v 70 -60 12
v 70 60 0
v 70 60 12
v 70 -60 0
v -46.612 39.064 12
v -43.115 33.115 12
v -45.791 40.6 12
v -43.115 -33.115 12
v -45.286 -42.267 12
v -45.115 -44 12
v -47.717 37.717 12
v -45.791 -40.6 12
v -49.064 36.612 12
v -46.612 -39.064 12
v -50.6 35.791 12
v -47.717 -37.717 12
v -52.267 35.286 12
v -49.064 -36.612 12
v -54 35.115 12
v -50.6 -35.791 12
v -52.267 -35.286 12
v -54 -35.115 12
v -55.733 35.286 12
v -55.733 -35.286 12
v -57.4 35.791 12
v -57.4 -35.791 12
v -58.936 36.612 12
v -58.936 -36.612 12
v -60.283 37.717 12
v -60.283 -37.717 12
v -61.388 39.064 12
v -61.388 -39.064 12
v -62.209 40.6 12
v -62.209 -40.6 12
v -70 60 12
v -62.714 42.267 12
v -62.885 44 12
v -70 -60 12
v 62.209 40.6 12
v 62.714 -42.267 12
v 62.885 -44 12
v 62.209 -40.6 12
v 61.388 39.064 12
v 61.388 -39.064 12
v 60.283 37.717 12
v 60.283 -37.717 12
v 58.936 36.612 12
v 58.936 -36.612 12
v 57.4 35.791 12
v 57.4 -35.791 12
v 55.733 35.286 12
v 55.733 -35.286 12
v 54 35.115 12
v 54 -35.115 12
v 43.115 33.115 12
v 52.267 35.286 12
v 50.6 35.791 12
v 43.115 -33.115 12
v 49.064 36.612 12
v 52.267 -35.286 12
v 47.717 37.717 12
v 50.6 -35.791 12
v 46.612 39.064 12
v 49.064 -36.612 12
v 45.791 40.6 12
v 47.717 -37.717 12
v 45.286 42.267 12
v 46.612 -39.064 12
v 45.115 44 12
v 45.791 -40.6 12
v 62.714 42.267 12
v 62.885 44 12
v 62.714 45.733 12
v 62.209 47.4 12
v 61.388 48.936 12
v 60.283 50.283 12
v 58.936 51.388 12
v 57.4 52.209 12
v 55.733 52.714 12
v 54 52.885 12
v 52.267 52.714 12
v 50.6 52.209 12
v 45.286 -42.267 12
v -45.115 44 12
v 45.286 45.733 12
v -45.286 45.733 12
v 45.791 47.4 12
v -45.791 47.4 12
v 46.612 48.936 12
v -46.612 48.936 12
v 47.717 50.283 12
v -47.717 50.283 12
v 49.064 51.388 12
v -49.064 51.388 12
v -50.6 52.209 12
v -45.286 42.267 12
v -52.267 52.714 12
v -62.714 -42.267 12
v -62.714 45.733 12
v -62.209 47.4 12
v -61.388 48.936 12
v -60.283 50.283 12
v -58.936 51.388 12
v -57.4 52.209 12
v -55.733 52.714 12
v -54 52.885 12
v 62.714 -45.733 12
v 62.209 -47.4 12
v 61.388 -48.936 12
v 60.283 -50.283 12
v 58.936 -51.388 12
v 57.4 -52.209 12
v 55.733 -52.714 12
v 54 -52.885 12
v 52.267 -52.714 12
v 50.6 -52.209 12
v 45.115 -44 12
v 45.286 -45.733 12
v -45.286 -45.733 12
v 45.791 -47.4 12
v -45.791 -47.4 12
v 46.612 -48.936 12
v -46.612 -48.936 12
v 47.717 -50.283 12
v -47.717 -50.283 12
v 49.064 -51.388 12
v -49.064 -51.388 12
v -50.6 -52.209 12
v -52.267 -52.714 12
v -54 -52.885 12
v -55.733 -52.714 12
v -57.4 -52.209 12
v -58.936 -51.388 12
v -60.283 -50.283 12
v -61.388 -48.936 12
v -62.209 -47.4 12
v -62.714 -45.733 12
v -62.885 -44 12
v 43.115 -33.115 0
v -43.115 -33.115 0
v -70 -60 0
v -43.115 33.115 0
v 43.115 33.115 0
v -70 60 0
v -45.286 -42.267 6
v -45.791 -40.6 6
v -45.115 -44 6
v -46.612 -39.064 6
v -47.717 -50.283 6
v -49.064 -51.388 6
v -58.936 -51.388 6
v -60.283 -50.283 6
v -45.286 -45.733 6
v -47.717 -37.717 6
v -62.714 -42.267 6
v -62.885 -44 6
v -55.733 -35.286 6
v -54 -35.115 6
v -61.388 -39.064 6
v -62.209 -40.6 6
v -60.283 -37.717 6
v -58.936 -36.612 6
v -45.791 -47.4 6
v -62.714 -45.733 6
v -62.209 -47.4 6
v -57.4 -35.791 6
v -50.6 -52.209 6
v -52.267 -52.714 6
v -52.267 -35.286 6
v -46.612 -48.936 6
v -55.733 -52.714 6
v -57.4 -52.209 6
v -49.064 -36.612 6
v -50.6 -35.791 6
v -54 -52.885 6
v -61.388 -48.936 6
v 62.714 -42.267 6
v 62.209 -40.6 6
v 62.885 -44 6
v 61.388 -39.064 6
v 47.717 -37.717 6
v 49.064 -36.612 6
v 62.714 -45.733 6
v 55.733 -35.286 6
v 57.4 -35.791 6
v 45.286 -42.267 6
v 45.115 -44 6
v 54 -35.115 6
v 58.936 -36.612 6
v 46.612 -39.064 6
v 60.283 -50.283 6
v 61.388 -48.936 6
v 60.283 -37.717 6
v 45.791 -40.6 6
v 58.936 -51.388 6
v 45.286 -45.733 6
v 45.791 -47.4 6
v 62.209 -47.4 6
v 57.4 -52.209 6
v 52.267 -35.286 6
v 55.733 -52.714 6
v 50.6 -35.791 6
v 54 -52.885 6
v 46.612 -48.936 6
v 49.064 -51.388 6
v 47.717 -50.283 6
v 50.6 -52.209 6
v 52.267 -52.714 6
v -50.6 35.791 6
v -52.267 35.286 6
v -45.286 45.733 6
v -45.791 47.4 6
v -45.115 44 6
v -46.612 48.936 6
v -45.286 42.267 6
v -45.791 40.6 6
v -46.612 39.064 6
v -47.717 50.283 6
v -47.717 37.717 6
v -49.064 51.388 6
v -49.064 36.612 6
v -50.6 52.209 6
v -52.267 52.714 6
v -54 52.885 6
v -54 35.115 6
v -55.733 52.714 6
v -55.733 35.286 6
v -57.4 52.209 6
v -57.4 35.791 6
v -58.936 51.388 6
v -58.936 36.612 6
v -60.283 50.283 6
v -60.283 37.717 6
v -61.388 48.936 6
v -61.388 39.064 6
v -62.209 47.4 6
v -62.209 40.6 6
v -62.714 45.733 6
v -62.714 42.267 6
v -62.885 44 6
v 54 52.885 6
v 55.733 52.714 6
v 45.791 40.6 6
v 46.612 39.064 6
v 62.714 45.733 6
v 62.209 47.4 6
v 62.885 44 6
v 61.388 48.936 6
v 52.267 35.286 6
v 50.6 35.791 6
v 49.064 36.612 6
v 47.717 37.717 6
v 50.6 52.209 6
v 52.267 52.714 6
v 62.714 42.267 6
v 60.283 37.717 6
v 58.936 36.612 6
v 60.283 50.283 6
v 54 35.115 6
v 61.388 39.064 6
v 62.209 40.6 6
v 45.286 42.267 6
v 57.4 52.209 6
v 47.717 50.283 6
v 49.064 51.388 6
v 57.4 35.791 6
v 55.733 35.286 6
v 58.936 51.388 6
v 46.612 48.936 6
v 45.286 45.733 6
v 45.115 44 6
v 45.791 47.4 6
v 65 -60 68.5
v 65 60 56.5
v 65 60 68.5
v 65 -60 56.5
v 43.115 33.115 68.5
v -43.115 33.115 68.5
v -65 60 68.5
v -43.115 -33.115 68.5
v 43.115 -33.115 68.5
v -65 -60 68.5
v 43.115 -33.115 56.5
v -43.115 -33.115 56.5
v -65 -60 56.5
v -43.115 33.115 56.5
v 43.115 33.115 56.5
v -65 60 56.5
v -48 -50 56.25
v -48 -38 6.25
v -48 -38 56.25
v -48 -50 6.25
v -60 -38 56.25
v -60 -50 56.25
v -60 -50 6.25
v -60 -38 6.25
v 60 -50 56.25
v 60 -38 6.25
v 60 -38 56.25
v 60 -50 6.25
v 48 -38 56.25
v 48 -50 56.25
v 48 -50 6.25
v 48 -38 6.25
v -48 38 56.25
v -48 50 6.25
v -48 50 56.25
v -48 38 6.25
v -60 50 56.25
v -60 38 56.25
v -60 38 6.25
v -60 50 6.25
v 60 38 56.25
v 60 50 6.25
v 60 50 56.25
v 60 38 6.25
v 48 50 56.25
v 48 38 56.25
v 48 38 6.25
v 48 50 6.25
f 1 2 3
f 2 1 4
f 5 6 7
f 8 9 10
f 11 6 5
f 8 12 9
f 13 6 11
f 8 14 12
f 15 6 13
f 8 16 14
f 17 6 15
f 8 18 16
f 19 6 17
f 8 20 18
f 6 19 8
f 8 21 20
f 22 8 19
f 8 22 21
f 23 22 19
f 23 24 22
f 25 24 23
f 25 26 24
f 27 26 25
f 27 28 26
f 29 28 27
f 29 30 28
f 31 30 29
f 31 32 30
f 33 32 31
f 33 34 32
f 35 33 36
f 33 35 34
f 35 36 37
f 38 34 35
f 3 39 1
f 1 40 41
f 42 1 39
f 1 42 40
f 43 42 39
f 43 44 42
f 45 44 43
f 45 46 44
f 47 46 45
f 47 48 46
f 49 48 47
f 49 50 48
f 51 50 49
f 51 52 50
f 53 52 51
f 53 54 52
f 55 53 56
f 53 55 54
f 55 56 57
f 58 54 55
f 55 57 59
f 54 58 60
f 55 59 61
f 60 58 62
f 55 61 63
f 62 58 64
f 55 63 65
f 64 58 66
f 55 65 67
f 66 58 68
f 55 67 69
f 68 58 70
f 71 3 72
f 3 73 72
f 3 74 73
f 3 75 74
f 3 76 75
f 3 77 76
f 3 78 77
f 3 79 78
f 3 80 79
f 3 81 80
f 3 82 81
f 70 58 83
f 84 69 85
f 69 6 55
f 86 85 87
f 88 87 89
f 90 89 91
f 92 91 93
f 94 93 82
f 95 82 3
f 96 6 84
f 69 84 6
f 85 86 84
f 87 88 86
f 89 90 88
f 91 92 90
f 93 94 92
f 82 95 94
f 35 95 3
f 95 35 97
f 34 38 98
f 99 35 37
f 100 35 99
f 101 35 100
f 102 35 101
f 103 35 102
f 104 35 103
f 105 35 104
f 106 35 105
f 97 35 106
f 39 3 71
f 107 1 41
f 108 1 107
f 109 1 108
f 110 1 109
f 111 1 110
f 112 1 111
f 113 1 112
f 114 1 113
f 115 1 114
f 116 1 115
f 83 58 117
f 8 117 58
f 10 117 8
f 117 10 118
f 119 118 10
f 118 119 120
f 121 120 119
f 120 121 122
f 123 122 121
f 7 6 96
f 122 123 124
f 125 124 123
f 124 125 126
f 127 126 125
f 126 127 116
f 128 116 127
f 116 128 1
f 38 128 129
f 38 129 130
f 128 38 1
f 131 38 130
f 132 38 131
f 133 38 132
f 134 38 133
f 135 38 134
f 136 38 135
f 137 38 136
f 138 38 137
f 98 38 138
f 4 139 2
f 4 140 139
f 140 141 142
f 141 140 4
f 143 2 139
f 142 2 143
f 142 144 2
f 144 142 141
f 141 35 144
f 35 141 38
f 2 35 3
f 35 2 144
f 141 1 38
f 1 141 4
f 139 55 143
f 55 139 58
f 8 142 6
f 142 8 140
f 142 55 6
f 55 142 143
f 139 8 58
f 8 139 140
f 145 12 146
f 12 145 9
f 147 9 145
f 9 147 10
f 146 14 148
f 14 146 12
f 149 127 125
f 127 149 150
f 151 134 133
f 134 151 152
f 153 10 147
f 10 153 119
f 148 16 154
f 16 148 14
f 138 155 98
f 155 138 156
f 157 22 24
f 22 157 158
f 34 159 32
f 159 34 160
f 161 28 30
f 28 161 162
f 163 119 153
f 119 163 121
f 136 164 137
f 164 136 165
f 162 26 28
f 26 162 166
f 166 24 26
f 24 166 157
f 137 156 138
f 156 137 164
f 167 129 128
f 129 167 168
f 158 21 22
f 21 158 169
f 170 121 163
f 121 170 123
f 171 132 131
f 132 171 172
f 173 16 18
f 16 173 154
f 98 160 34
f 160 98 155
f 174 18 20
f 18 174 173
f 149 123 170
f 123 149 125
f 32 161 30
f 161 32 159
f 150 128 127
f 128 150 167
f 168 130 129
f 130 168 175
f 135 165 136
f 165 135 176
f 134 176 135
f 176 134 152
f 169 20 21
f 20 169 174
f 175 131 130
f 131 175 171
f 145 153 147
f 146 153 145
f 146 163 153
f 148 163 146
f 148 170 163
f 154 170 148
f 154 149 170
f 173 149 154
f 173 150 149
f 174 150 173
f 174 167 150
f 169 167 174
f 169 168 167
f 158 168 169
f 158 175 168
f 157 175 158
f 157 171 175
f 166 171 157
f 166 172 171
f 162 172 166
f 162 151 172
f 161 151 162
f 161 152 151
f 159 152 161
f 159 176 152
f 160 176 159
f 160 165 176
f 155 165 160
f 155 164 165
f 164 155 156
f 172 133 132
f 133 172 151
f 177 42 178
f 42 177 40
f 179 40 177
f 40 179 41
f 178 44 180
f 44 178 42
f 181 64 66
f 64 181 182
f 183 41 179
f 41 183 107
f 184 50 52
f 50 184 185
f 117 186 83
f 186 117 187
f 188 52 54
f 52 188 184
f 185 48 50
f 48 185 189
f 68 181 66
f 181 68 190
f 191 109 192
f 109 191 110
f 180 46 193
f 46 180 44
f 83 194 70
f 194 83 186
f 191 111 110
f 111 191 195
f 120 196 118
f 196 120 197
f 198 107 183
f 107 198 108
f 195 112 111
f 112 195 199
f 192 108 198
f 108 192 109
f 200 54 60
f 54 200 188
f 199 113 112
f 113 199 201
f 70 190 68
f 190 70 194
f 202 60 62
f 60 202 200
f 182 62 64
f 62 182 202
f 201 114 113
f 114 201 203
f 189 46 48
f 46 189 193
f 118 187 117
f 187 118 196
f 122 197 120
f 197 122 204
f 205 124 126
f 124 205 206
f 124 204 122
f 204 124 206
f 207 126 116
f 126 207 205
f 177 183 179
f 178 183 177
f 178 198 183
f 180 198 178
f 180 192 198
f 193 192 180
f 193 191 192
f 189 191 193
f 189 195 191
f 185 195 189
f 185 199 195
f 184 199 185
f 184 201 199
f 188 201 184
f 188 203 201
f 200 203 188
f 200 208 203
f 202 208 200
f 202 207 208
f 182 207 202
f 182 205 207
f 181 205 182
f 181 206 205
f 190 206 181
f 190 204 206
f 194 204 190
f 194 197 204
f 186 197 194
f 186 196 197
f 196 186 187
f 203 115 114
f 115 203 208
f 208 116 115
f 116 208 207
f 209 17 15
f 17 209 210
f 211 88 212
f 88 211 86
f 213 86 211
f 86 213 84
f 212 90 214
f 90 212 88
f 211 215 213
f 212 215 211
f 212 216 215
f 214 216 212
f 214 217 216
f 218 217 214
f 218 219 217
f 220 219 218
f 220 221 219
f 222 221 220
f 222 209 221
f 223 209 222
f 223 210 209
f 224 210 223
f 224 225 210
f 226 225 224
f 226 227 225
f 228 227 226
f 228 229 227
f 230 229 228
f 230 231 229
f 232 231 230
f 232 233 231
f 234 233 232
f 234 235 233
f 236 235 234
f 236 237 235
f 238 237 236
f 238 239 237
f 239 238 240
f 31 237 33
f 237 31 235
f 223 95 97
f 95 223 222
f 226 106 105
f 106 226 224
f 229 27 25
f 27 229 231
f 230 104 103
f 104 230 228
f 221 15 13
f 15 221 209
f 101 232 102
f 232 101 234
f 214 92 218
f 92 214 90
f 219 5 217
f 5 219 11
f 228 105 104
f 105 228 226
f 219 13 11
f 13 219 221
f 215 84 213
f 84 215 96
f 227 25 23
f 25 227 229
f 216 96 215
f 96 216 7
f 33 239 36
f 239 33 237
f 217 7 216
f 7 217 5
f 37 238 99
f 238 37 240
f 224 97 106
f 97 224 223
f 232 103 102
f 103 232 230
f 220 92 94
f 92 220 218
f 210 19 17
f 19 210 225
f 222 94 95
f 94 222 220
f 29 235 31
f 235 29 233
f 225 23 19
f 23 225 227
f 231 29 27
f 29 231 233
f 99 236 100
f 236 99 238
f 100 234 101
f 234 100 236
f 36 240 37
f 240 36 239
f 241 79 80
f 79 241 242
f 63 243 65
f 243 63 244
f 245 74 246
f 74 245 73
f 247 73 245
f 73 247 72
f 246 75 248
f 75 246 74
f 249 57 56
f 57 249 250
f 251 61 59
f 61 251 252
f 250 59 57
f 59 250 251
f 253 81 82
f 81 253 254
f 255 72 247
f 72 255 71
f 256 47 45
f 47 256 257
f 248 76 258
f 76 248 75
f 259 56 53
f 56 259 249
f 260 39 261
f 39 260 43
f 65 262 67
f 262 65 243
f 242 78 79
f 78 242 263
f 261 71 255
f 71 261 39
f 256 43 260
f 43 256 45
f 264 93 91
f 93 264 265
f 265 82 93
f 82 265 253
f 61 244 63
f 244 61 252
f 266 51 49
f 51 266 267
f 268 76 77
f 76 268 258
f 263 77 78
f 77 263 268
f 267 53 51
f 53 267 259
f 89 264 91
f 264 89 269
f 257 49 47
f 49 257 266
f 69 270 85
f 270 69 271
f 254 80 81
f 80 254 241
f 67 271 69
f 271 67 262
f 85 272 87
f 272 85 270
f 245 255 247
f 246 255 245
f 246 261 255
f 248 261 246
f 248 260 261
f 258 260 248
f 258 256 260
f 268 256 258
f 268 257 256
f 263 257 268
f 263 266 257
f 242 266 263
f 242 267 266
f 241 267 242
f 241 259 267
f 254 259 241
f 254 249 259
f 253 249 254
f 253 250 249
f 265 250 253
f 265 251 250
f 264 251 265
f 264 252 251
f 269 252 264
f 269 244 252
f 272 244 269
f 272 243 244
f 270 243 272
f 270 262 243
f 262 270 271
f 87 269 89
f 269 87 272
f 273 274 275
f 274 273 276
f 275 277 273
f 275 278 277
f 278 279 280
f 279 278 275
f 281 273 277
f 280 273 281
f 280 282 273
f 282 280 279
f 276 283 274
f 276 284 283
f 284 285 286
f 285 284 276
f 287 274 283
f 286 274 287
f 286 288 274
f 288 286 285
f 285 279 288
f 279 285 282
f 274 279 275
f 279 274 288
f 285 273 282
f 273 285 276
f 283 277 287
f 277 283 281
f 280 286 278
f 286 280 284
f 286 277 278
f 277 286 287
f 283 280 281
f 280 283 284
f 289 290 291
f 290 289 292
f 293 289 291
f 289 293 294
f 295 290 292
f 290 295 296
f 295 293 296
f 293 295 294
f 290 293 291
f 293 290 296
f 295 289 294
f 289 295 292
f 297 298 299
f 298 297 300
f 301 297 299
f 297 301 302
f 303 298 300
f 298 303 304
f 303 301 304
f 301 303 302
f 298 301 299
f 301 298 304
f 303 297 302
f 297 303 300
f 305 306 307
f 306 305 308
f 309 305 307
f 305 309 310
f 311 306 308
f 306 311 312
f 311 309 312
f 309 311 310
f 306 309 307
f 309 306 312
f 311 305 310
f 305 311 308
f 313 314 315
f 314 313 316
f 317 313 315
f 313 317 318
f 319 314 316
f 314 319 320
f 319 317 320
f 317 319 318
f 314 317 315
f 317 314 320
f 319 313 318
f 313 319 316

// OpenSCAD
$fn = 32;

// ------------------------------------------------------------------------
// Frame cube: base 140 x 120 mm, posts 50 mm tall
// Every part is its own module, assembly() places every instance.
// ------------------------------------------------------------------------

// --- part 1 ---
module base_frame() {
  difference() {
    translate([-70, -60, 0]) cube([140, 120, 12]);
    translate([-43.115, -33.115, -1]) cube([86.23, 66.23, 14]);
    translate([-54, -44, 6]) cylinder(h = 7, d = 17.77);
    translate([54, -44, 6]) cylinder(h = 7, d = 17.77);
    translate([-54, 44, 6]) cylinder(h = 7, d = 17.77);
    translate([54, 44, 6]) cylinder(h = 7, d = 17.77);
  }
}

// --- part 2 ---
module corner_post() {
  translate([-6, -6, 0]) cube([12, 12, 50]);
}

// --- part 3 ---
module top_frame() {
  difference() {
    translate([-65, -60, 0]) cube([130, 120, 12]);
    translate([-43.115, -33.115, -1]) cube([86.23, 66.23, 14]);
  }
}

// --- assembly ---
module assembly() {
  color([0.80, 0.24, 0.20]) translate([0, 0, 0]) rotate([0, 0, 0]) base_frame();
  color([0.20, 0.45, 0.75]) translate([-54, -44, 6.25]) rotate([0, 0, 0]) corner_post();
  color([0.25, 0.62, 0.32]) translate([54, -44, 6.25]) rotate([0, 0, 0]) corner_post();
  color([0.92, 0.70, 0.18]) translate([-54, 44, 6.25]) rotate([0, 0, 0]) corner_post();
  color([0.58, 0.35, 0.70]) translate([54, 44, 6.25]) rotate([0, 0, 0]) corner_post();
  color([0.16, 0.66, 0.66]) translate([0, 0, 56.5]) rotate([0, 0, 0]) top_frame();
}

assembly();
